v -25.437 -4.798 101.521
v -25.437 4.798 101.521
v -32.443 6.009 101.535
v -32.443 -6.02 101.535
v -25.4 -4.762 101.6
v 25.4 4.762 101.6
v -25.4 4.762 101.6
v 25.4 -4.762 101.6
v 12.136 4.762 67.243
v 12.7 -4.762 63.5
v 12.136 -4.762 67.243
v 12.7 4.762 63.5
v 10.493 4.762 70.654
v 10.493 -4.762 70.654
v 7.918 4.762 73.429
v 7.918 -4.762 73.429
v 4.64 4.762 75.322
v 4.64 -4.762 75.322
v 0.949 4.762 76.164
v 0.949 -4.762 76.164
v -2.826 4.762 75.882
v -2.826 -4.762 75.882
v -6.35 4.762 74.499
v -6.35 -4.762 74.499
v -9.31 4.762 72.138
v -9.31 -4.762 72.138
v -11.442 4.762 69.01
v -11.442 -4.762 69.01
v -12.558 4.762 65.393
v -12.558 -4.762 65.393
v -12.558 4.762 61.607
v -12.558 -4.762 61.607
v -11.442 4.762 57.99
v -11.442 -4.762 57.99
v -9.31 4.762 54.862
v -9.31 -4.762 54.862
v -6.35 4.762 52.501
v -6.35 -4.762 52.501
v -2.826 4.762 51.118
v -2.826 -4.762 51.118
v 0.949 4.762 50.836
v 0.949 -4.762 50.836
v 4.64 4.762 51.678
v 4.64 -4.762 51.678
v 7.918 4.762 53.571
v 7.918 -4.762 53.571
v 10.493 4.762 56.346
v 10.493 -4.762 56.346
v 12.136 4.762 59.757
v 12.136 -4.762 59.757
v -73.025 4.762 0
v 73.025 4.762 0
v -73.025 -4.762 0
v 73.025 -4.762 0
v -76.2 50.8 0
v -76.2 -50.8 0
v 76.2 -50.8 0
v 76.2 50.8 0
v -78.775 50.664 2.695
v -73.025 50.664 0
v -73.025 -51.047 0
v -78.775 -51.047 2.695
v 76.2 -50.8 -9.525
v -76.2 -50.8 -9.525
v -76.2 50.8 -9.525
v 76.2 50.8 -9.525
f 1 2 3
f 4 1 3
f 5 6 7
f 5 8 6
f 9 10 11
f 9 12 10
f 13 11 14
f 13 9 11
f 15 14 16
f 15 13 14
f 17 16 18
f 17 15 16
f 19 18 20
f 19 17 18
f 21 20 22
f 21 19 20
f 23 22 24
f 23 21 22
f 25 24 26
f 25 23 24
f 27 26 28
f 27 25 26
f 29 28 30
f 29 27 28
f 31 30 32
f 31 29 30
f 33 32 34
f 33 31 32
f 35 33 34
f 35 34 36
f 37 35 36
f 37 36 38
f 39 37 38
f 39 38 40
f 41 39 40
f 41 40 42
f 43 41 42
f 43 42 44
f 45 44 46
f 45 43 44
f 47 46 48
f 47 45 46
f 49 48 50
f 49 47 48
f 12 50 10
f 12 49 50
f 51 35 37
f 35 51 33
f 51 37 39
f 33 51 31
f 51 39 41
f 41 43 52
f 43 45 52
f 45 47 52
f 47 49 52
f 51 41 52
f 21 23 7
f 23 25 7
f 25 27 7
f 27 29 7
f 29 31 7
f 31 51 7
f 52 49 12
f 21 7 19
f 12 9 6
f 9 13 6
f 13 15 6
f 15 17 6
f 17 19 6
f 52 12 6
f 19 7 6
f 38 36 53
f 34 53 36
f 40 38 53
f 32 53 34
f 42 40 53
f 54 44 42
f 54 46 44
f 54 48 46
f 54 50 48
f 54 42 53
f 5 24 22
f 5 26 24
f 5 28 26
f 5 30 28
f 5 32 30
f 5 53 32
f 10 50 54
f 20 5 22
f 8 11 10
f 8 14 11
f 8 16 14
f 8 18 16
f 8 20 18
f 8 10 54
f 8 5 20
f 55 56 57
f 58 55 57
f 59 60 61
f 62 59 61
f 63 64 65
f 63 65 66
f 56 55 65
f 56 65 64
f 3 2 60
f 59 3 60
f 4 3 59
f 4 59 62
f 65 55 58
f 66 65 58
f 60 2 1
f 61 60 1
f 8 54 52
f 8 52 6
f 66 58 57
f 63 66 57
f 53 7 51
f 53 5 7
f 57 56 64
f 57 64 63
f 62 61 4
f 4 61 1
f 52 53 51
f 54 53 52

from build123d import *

# Parameters (mm, degrees)
F0_R        = 12.7
F1_DEPTH    = 4.7625
F2_W        = 152.4
F2_H        = 101.6
F3_DEPTH    = 9.525
F5_DEPTH    = 6.35
F6_T1_DEPTH = 43.3965999996


# Not quite as in the source:
# - a fillet or chamfer that OpenCascade refuses, or shapes differently, is made with other operations: its cross-section is extruded or revolved along the edge and cut away or added


with BuildPart() as f1:
    # F0 (on Front) → F1 (new body, symmetric)
    with BuildSketch(Plane.XZ):
        Polygon((-25.4, 101.6), (-73.025, 0), (73.025, 0), (25.4, 101.6), align=None)
        with Locations((0, 63.5)):
            Circle(F0_R, mode=Mode.SUBTRACT)
    extrude(amount=F1_DEPTH, both=True)


with BuildPart() as f3:
    # F2 (on face) → F3 (new body)
    with BuildSketch(Plane(origin=(0, 0, 0), x_dir=(1, 0, 0), z_dir=(0, 0, -1))):
        Rectangle(F2_W, F2_H)
    extrude(amount=F3_DEPTH)


with BuildPart() as f5:
    # F4 (on face) → F5 (new body)
    with BuildSketch(Plane(origin=(-59.8699759808, 0, 28.064051241), x_dir=(0, -1, 0), z_dir=(-0.905458936, 0, 0.4244338762))):
        Polygon((4.7625, 81.2140074372), (-4.7625, 81.2140074372), (-50.6641343236, -30.9942838117), (51.0465875268, -30.9942838117), align=None)
    extrude(amount=F5_DEPTH)

    # F6: chamfer of 3.048 x 6.5364570937 on 1 edges, made by hand

    # F6_s2 → F6_t1 (cut)
    with BuildSketch(Plane.XZ.offset(-21.6982999998)):
        Polygon((-25.2311707583, 101.520861293), (-32.4433386981, 101.5353162773), (-31.1496642433, 104.2951551141), align=None)
    extrude(amount=F6_T1_DEPTH, mode=Mode.SUBTRACT)


solid = Compound([f1.part, f3.part, f5.part])
